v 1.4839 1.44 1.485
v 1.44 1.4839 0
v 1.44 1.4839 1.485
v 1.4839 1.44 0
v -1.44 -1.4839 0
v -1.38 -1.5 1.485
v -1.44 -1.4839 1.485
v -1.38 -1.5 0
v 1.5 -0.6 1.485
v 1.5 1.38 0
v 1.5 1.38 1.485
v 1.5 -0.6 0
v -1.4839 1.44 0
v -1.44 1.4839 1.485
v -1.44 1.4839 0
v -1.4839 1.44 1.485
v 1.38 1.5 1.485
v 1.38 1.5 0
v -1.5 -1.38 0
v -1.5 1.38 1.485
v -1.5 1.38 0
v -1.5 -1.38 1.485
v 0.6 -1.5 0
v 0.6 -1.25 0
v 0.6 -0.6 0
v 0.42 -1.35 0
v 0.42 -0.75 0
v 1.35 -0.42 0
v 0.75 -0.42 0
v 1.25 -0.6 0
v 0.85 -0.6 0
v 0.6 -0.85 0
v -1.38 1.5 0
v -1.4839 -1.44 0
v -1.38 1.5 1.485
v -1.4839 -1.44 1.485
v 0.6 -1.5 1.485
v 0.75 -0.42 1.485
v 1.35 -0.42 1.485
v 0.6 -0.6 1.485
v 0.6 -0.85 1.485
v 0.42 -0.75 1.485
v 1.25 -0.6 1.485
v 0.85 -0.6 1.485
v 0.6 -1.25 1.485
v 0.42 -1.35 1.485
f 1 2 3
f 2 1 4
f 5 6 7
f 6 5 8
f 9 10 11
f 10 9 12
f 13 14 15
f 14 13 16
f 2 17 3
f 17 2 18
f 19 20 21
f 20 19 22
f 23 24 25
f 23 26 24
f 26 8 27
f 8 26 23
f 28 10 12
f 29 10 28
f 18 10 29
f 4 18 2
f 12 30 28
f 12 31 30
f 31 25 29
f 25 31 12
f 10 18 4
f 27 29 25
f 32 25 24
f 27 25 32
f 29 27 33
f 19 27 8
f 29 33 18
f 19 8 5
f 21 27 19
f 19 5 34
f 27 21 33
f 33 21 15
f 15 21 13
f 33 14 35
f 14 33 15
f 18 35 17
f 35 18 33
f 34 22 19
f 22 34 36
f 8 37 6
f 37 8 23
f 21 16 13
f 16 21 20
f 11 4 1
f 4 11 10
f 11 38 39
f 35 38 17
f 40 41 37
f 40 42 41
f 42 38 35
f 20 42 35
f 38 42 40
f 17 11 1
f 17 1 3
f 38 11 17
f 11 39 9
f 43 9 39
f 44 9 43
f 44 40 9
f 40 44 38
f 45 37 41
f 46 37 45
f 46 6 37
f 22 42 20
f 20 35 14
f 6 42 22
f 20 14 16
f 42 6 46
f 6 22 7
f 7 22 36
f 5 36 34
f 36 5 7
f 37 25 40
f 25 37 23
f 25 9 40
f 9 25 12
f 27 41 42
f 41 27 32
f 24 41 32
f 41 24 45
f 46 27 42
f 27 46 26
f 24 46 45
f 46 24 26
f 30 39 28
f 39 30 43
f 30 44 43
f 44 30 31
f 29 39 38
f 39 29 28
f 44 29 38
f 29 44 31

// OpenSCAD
// 传国玉玺 · 机械部分（CSG）—— 单位：1 寸 = 0.75
//
// 坐标：X/Y 水平，Z 向上。OpenSCAD 与 Blender **都是 Z-up**，无需旋转。
// 燕尾槽沿 Z 贯穿 —— 金角只能**沿槽向（竖直）**滑进滑出，
// 这正是"倒勾"的意义：横向拔不出来，只能顺着槽拔。Exploded 位移据此定。

SIDE = 3.0;      // 方四寸
BH = 1.485;      // 印台高（通高 2.7 的 55%）
NOTCH = 0.9;     // 缺角边长（1.2 寸）
HALF = SIDE / 2; // 1.5
R = 0.12;        // 外角圆角
OVER = 2;        // 贯穿切余量

DT_D = 0.18;     // 燕尾槽深（沿壁法向伸入玉体）
DT_M = 0.40;     // 槽口宽
DT_W = 0.60;     // 槽底宽（> 口宽 ⟹ 倒勾）
DT_C = 1.05;     // 槽中心（沿另一水平轴）

/** 圆角方柱：四角各一根圆柱取 hull */
module rounded_prism(s, h, r) {
  hull() {
    for (sx = [-1, 1]) for (sy = [-1, 1])
      translate([sx * (s / 2 - r), sy * (s / 2 - r), 0])
        cylinder(h = h, r = r, $fn = 12);
  }
}

/** 缺角所在的象限：x > 0.6 且 **y < -0.6**
 *  注意符号：glTF 导出时 Blender 的 +Y → glTF 的 −Z，
 *  所以想让缺角落在 glTF 的 (+x, +z) 角，Blender 侧必须放在 −y。 */
module corner_quadrant(z_extra) {
  translate([1.8, -1.8, BH / 2])
    cube([2.4, 2.4, BH + z_extra], center = true);
}

/** 燕尾槽 A：开在 x = +0.6 壁面（该壁只在缺口一侧存在），槽底朝 -x 伸入玉体。
 *  槽中心线必须**跟着缺口方位**走到 y = −1.05，否则会挖进玉体内部成暗腔。 */
module dovetail_slot_x() {
  xm = HALF - NOTCH;              // 0.60 壁面
  xi = xm - DT_D;                 // 0.42 槽底
  yc = -(HALF - NOTCH / 2);       // −1.05 槽中心（跟随缺口）
  polygon(points = [
    [xm, yc - DT_M / 2],
    [xi, yc - DT_W / 2],
    [xi, yc + DT_W / 2],
    [xm, yc + DT_M / 2]
  ]);
}

/** 燕尾槽 B：开在 y = −0.6 壁面，槽底朝 +y 伸入玉体（与缺口侧对称） */
module dovetail_slot_y() {
  ym = -(HALF - NOTCH);   // −0.60 壁面
  yi = ym + DT_D;         // −0.42 槽底
  polygon(points = [
    [DT_C - DT_M / 2, ym],
    [DT_C - DT_W / 2, yi],
    [DT_C + DT_W / 2, yi],
    [DT_C + DT_M / 2, ym]
  ]);
}

/** 玉体：方柱 − 缺角 − 两道燕尾槽 */
module jade_body() {
  difference() {
    rounded_prism(SIDE, BH, R);
    corner_quadrant(OVER);
    translate([0, 0, -OVER / 2]) linear_extrude(height = BH + OVER) dovetail_slot_x();
    translate([0, 0, -OVER / 2]) linear_extrude(height = BH + OVER) dovetail_slot_y();
  }
}

/** 金镶角：缺角补形 + 两枚燕尾榫。**只取印台高度**，不做贯穿余量 */
module gold_corner() {
  union() {
    intersection() {
      rounded_prism(SIDE, BH, R);
      corner_quadrant(OVER);
    }
    linear_extrude(height = BH) dovetail_slot_x();
    linear_extrude(height = BH) dovetail_slot_y();
  }
}

jade_body();
